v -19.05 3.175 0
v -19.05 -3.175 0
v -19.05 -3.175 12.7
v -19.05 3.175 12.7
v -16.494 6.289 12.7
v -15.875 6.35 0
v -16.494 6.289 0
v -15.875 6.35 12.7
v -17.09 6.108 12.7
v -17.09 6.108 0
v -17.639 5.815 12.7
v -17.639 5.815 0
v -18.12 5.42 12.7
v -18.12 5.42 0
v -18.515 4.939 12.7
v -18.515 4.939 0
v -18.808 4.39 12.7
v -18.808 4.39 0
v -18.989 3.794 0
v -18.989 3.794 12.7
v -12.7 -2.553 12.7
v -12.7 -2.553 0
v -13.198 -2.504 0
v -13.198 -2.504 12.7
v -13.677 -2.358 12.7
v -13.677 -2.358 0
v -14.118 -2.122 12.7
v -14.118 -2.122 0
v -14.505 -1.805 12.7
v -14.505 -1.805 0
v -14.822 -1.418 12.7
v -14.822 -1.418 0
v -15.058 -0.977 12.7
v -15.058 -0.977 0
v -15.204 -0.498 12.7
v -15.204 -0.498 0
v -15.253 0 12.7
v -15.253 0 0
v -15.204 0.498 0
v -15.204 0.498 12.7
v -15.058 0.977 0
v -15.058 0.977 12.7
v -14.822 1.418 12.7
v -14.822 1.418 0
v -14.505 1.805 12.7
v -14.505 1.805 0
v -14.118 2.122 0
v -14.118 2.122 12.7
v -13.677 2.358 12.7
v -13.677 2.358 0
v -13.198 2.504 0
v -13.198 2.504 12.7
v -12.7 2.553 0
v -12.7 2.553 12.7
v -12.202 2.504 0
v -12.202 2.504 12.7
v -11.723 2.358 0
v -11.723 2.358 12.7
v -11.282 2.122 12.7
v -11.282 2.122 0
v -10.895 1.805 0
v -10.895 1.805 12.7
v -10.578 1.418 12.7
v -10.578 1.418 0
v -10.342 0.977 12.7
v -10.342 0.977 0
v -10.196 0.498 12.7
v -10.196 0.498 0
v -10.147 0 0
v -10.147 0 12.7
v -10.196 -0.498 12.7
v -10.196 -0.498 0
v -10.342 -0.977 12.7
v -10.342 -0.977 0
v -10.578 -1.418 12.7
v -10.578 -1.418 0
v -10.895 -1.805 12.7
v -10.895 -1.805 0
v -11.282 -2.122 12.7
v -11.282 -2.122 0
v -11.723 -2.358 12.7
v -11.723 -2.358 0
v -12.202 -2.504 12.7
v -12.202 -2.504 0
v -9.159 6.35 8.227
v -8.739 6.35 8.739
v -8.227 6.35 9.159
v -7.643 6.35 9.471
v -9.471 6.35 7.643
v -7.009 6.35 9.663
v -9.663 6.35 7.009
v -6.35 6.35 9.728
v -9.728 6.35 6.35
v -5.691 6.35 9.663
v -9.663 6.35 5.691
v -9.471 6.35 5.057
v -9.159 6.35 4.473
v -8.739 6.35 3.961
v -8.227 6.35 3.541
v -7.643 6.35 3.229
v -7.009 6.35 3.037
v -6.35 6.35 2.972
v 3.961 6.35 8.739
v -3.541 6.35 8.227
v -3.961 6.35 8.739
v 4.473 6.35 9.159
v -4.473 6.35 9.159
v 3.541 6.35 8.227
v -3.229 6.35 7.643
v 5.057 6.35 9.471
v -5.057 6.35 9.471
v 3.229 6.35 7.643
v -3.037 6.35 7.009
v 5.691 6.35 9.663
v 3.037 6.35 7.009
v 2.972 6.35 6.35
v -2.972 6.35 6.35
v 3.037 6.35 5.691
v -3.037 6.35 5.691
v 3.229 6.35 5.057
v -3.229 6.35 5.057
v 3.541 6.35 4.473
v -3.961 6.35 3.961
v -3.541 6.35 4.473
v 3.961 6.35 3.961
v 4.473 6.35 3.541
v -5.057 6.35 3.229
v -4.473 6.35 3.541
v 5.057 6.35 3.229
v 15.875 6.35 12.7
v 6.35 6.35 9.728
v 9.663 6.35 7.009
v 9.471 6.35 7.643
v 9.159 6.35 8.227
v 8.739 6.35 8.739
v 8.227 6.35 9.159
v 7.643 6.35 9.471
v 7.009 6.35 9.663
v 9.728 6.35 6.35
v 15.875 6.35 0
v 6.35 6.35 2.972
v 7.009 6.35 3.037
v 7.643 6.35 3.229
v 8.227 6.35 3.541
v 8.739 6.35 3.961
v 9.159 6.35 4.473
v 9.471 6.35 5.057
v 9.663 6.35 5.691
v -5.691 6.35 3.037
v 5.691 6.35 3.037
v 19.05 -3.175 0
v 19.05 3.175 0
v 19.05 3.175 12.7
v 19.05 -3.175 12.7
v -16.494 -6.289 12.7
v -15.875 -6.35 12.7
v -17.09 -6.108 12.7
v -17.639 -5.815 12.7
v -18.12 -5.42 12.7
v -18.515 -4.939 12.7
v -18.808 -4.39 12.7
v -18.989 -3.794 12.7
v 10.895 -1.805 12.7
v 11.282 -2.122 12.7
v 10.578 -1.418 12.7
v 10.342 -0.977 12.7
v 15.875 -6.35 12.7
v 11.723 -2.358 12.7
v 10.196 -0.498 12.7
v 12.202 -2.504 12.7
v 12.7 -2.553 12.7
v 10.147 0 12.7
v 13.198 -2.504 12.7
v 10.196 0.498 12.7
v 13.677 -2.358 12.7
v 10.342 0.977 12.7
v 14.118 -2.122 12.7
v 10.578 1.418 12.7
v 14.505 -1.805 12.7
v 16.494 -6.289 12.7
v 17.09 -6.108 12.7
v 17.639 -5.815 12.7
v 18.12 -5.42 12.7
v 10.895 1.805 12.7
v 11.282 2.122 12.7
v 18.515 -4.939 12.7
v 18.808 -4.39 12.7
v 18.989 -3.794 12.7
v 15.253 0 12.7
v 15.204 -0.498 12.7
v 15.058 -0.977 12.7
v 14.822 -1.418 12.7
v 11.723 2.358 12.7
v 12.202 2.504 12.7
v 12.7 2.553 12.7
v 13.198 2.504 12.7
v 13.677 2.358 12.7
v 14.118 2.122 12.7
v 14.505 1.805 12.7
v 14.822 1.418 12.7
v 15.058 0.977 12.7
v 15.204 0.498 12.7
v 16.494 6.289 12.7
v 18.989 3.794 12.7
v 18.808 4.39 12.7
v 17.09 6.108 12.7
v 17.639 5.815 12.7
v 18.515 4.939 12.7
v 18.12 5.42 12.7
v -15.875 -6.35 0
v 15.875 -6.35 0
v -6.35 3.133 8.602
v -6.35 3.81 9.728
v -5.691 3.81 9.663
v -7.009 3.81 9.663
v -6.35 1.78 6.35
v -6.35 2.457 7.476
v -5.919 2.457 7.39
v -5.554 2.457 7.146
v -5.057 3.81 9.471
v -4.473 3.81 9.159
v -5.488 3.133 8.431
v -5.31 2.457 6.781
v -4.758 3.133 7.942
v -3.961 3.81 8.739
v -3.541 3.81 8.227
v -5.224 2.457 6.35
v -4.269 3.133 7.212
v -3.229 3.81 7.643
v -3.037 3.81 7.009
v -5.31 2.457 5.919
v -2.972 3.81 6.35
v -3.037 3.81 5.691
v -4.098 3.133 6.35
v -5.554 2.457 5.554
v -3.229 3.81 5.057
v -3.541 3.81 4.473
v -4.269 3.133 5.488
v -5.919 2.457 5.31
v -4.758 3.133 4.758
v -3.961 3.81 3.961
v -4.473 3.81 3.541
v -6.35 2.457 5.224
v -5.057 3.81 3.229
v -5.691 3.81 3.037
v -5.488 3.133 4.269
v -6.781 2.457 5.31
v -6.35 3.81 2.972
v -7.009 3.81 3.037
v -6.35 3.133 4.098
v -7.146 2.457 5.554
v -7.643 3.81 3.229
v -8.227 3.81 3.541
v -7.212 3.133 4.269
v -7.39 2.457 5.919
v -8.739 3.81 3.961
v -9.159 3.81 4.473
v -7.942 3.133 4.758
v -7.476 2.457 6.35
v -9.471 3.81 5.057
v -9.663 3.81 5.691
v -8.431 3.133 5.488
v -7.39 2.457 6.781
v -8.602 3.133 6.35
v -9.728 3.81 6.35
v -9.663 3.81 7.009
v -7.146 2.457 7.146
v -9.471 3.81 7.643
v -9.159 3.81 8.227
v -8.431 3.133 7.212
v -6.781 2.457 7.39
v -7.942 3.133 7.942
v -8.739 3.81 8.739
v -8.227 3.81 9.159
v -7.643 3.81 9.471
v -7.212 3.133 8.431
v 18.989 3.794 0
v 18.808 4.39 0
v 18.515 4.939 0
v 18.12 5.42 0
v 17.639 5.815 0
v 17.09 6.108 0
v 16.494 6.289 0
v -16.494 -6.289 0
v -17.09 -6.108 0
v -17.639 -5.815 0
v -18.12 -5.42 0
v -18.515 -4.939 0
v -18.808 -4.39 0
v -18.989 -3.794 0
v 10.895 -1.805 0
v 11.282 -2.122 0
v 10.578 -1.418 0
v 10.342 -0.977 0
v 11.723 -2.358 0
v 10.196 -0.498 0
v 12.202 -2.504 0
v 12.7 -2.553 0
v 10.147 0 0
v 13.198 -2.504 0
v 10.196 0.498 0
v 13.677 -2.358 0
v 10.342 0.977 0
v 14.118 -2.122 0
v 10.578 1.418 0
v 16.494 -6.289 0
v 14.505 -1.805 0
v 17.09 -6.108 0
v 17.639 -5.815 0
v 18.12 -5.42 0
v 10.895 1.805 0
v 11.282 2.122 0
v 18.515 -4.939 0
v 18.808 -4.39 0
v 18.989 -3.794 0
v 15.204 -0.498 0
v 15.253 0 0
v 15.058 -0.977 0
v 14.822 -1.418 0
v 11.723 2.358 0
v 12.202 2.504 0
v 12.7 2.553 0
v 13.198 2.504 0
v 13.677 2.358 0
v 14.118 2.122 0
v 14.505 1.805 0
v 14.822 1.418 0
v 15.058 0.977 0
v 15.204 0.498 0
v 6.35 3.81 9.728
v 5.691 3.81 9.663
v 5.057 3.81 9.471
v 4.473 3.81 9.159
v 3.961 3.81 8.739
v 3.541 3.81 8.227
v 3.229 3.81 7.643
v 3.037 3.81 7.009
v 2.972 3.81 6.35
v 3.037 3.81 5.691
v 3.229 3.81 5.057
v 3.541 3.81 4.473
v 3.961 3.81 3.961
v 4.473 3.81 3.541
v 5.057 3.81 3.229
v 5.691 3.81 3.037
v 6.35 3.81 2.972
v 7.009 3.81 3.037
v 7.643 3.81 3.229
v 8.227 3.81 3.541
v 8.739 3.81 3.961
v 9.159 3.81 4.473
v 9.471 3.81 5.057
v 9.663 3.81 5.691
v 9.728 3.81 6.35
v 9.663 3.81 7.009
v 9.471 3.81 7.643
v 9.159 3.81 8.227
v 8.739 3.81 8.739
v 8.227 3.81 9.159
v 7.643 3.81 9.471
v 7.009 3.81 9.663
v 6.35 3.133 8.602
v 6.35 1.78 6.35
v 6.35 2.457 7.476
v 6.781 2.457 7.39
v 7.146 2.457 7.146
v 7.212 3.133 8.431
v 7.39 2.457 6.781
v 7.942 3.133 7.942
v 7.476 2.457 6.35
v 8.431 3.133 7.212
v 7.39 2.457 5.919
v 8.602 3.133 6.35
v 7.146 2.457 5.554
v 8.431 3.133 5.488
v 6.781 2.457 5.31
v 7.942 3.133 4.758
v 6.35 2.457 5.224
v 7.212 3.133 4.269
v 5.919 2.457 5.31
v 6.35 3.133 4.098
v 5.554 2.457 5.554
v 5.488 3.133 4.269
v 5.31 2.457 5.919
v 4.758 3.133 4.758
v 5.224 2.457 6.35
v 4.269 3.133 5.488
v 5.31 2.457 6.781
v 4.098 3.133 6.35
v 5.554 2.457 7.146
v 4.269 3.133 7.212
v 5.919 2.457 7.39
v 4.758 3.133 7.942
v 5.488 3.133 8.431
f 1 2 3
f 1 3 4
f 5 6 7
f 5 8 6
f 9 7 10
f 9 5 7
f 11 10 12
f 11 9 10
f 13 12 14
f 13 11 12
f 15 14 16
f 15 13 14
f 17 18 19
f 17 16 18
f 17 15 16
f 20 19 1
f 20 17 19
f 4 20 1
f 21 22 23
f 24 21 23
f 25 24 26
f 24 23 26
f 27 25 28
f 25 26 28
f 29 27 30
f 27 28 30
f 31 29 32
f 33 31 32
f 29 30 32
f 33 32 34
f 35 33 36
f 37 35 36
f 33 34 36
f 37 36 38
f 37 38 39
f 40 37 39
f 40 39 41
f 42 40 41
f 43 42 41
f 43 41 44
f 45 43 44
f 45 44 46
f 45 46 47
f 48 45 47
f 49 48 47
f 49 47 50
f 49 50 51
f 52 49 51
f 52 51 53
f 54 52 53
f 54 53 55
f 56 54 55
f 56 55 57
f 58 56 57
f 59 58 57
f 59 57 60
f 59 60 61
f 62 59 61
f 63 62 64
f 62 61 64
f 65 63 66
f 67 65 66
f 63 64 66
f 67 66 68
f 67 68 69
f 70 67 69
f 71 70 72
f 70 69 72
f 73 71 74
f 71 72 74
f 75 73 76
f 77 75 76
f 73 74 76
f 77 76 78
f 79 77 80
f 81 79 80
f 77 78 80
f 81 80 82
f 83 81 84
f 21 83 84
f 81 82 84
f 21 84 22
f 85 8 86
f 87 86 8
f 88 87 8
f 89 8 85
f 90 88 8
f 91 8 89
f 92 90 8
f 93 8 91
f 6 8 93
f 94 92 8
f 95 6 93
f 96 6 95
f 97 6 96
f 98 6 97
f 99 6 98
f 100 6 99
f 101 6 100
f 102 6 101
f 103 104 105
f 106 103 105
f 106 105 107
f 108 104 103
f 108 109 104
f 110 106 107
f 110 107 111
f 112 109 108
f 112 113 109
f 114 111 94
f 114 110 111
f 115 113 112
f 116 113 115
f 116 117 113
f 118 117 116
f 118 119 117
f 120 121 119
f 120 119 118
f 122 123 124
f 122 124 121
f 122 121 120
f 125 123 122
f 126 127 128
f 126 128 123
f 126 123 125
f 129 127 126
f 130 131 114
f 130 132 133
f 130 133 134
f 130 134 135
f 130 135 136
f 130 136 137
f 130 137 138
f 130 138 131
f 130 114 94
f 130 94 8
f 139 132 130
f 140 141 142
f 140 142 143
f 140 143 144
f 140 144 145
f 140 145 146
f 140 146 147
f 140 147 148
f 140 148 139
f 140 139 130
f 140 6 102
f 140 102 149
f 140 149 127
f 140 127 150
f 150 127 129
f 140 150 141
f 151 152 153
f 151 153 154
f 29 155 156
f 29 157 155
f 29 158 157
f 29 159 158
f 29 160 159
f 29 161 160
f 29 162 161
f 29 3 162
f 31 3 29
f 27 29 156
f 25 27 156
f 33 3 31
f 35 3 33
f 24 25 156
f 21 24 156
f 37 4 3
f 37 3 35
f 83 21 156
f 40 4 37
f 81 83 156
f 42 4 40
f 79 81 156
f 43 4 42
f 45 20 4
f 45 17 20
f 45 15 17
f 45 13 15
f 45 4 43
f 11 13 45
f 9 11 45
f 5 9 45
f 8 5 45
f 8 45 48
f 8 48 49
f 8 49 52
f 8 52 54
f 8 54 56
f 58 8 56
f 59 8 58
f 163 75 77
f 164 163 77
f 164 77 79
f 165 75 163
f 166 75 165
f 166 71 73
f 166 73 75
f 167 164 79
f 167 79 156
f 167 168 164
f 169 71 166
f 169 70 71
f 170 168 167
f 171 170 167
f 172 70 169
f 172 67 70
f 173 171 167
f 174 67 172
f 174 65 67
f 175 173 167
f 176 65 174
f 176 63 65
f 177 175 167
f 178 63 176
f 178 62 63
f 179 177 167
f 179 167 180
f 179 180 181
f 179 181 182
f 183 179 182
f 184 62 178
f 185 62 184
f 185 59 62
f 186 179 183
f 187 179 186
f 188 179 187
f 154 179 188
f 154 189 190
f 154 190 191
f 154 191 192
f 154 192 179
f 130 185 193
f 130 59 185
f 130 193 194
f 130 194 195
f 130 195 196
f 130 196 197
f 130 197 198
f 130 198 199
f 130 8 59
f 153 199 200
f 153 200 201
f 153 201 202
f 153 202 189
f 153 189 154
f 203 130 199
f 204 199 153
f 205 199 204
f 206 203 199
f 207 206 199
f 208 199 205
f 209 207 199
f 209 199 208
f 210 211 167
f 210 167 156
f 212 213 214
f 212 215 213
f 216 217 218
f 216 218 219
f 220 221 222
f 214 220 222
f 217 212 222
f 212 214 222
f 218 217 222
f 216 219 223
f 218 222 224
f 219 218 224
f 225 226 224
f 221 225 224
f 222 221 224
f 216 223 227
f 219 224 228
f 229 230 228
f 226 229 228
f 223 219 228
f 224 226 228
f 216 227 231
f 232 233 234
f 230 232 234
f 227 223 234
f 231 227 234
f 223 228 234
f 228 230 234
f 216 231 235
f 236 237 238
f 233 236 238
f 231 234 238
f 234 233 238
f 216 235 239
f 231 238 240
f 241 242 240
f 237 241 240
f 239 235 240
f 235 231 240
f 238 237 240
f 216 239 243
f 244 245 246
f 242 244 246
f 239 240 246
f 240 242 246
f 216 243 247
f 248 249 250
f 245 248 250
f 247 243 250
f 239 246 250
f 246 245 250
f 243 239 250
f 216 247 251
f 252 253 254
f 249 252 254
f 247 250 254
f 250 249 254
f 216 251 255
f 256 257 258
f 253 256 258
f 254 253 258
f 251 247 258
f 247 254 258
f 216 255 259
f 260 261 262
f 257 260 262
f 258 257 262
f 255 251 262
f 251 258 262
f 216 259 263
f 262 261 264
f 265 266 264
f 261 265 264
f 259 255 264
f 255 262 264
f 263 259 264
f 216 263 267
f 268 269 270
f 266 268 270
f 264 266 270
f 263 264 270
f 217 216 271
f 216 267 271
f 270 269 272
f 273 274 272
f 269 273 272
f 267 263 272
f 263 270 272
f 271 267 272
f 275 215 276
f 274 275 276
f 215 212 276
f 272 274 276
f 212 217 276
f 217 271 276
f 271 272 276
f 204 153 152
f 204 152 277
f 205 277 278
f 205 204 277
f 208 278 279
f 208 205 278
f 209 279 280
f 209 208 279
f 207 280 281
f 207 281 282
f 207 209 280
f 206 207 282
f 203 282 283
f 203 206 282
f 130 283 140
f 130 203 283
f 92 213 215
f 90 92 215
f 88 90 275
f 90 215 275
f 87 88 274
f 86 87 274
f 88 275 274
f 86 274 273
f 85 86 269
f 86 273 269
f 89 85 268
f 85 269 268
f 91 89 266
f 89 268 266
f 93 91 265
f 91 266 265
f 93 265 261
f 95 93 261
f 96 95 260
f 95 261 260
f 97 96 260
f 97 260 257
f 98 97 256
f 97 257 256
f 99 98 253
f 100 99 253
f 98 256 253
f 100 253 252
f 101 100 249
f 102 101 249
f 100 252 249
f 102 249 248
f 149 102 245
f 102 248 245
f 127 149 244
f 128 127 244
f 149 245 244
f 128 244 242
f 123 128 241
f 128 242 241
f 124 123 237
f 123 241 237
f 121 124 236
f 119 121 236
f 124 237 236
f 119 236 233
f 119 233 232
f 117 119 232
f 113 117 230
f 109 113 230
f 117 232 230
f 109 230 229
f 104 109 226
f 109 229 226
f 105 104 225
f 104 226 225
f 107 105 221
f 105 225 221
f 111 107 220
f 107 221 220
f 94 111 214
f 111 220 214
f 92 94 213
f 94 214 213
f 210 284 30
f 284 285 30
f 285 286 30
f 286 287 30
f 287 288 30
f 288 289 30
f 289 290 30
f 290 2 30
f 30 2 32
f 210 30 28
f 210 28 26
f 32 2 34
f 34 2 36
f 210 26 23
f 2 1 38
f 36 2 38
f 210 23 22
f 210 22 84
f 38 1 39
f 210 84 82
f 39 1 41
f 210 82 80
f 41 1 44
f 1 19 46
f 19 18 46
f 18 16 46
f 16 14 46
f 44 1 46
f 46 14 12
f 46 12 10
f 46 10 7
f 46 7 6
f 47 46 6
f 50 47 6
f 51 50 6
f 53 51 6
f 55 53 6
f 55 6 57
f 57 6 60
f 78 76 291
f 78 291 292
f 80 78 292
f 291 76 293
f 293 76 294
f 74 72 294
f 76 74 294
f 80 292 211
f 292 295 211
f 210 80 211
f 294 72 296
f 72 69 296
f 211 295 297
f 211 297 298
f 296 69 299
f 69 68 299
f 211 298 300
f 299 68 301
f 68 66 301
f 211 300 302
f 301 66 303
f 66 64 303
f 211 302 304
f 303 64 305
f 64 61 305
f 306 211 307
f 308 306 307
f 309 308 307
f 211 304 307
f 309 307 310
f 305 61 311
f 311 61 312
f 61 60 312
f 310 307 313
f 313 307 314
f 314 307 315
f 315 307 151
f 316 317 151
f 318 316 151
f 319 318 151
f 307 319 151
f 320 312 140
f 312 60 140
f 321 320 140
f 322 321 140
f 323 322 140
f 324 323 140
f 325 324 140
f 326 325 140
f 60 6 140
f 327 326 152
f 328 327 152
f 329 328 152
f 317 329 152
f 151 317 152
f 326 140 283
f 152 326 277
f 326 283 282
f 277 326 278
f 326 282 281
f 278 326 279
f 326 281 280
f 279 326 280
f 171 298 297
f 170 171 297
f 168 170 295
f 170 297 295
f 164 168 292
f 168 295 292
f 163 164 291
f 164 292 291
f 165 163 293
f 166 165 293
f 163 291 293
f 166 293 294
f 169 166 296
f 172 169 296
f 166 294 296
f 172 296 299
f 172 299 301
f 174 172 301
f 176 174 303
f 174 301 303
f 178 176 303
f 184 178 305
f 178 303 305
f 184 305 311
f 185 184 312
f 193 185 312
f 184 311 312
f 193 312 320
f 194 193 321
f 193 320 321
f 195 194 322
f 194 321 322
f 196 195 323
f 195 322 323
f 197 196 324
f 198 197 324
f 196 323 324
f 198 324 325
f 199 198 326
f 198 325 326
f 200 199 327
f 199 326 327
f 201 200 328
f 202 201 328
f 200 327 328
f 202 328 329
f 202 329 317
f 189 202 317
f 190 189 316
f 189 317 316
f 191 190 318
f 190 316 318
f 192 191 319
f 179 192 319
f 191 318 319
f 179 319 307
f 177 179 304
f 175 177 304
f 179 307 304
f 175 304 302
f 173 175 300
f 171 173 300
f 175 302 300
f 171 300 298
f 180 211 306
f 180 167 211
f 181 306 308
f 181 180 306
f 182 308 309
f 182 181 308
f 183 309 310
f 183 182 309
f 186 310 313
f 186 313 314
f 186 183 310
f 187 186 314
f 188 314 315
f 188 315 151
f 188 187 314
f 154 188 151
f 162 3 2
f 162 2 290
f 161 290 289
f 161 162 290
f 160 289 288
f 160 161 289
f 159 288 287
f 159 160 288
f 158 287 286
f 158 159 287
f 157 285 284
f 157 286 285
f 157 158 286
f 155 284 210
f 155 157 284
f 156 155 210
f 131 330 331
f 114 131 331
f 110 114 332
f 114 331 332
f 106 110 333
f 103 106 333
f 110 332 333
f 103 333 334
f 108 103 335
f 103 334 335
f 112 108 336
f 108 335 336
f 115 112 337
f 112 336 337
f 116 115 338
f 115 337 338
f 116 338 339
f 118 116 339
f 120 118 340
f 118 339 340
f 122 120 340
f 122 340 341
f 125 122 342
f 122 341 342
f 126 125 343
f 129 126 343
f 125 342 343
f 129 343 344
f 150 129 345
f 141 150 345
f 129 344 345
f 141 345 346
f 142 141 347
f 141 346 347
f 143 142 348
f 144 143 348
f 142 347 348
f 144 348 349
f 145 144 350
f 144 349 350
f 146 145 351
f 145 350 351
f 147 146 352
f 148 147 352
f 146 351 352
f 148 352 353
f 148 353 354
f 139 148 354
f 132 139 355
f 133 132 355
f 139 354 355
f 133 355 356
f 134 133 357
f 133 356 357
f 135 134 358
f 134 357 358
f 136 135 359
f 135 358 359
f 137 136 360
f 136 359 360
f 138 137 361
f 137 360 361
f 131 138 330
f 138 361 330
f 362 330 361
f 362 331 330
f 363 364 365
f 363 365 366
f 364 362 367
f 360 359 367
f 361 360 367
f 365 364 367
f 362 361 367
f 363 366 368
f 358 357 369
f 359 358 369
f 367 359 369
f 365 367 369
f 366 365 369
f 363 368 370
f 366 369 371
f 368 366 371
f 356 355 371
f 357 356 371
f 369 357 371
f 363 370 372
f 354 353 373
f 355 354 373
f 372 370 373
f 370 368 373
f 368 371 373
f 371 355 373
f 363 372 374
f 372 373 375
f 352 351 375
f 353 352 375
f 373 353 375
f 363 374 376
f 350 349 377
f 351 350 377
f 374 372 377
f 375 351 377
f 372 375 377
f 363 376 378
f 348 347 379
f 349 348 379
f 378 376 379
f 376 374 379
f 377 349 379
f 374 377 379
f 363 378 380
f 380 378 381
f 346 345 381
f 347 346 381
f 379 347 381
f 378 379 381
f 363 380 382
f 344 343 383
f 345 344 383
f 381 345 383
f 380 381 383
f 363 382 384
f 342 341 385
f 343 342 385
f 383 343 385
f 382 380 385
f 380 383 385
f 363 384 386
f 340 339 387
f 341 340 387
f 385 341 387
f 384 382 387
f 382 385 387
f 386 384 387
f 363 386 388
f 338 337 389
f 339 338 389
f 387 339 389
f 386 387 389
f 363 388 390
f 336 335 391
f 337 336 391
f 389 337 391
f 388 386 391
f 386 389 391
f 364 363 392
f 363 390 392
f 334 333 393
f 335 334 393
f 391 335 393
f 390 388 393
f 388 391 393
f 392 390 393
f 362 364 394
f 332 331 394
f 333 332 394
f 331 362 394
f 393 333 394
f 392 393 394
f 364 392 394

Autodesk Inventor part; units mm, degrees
ref_plane "YZ Plane" through (0, 0, 0) normal (1, 0, 0) x (0, 1, 0)
ref_plane "XZ Plane" through (0, 0, 0) normal (0, 1, 0) x (-1, 0, 0)
ref_plane "XY Plane" through (0, 0, 0) normal (0, 0, 1) x (1, 0, 0)
sketch "Sketch1" plane through (0, 0, 0) normal (0, 0, 1) x (1, 0, 0)
  line L0 (19.05, -6.35) -> (-19.05, -6.35)
  line L1 (-19.05, -6.35) -> (-19.05, 6.35)
  line L2 (-19.05, 6.35) -> (19.05, 6.35)
  line L3 (19.05, 6.35) -> (19.05, -6.35)
  line L4 (19.05, -6.35) -> (-19.05, 6.35) construction
  line L5 (-19.05, -6.35) -> (19.05, 6.35) construction
  point P0 (0, 0)
  dimension "d0" = 38.1
  dimension "d1" = 12.7
extrude "Extrusion1" add sketch "Sketch1" along normal blind 12.7
sketch "Sketch2" plane through (-19.05, 6.35, 0) normal (0, 1, 0) x (1, 0, 0)
  line L0 (0, 0) -> (0, -12.7) construction
  line L1 (12.7, -6.35) -> (25.4, -6.35) construction
  line L2 (38.1, 0) -> (0, 0) construction
  line L3 (38.1, -12.7) -> (0, -12.7) construction
  point P0 (19.05, 0)
  point P1 (0, -6.35)
  point P2 (19.05, -6.35)
  point P3 (19.05, 0)
  point P4 (19.05, 0)
  dimension "d4" = 12.7
  dimension "d20" = 6.35
sketch "Sketch3" plane through (0, 0, 12.7) normal (0, 0, 1) x (1, 0, 0)
  line L0 (-12.7, 0) -> (12.7, 0) construction
  line L1 (-19.05, 6.35) -> (-19.05, -6.35) construction
  line L2 (19.05, 6.35) -> (-19.05, 6.35) construction
  point P0 (0, 0)
  point P1 (-19.05, 0)
  point P2 (0, 0)
  point P3 (0, 6.35)
  dimension "d12" = 25.4
hole "Hole2" at (-12.7, 0, 12.7) at (12.7, 0, 12.7) direction (0, 0, -1) diameter 5.1054 end through all clearance for "Flat Head Machine Screw (82)" size "#10" standard "Ansi Unified Screw Threads"
hole "Hole3" at (-6.35, 6.35, 6.35) at (6.35, 6.35, 6.35) direction (0, -1, 0) diameter 6.7564 depth 2.54 tip angle 118 clearance for "Flat Head Machine Screw (82)" size "1/4" standard "Ansi Unified Screw Threads"
fillet "Fillet1" radius 3.175 4 edges at (-19.05, 6.35, 6.35) (-19.05, -6.35, 6.35) (19.05, 6.35, 6.35) (19.05, -6.35, 6.35)
properties part number "CL7-GB-004" material "Aluminum 6061"
